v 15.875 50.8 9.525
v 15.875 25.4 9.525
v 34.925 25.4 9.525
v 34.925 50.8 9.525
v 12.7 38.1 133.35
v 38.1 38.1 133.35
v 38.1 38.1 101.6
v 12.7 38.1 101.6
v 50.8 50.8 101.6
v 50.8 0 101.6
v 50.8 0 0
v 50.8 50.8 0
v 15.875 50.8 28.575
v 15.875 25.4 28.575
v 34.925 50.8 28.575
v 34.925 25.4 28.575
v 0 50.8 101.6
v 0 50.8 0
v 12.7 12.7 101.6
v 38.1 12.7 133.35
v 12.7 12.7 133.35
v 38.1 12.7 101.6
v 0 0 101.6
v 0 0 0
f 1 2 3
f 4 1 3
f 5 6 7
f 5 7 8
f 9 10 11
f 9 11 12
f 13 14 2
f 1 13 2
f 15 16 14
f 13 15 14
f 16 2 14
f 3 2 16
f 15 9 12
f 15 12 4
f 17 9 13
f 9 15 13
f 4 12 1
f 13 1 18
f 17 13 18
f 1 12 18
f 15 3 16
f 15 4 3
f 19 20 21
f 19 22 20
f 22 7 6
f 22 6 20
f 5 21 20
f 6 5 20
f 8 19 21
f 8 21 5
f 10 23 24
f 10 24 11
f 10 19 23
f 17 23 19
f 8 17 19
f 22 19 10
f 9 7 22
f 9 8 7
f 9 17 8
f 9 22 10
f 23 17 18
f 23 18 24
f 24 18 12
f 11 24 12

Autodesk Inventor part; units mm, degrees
ref_plane "YZ Plane" through (0, 0, 0) normal (1, 0, 0) x (0, 1, 0)
ref_plane "XZ Plane" through (0, 0, 0) normal (0, 1, 0) x (-1, 0, 0)
ref_plane "XY Plane" through (0, 0, 0) normal (0, 0, 1) x (1, 0, 0)
sketch "Sketch1" plane through (0, 0, 0) normal (0, 0, 1) x (1, 0, 0)
  line L0 (0, 0) -> (50.8, 0)
  line L1 (50.8, 0) -> (50.8, 50.8)
  line L2 (50.8, 50.8) -> (0, 50.8)
  line L3 (0, 50.8) -> (0, 0)
  dimension "d0" = 50.8
  dimension "d1" = 50.8
extrude "Extrusion1" add sketch "Sketch1" along normal blind 101.6
sketch "Sketch2" plane through (0, 0, 101.6) normal (0, 0, 1) x (1, 0, 0)
  line L0 (50.8, 50.8) -> (0, 50.8) projected
  line L1 (25.4, 38.1) -> (12.7, 38.1)
  line L2 (12.7, 38.1) -> (38.1, 38.1)
  line L3 (38.1, 38.1) -> (38.1, 12.7)
  line L4 (38.1, 12.7) -> (12.7, 12.7)
  line L5 (12.7, 12.7) -> (12.7, 38.1)
  point P0 (0, 0)
  dimension "d8" = 25.4
  dimension "d9" = 25.4
extrude "Extrusion2" add sketch "Sketch2" along normal blind 31.75
sketch "Sketch3" plane through (0, 50.8, 0) normal (0, 1, 0) x (1, 0, 0)
  line L0 (50.8, 0) -> (0, 0) projected
  line L1 (25.4, 0) -> (25.4, -25.4)
  line L2 (25.4, -25.4) -> (19.05, -25.4)
  line L3 (19.05, -25.4) -> (19.05, -12.7)
  line L4 (19.05, -12.7) -> (25.4, -12.7)
  line L5 (25.4, -12.7) -> (25.4, -25.4)
  line L6 (25.4, -25.4) -> (31.75, -25.4)
  line L7 (31.75, -25.4) -> (31.75, -12.7)
  line L8 (31.75, -12.7) -> (25.4, -12.7)
  line L9 (25.4, -12.7) -> (25.4, -25.4)
  dimension "d12" = 25.4
  dimension "d13" = 6.35
  dimension "d14" = 12.7
  dimension "d15" = 6.35
extrude "Extrusion3" cut sketch "Sketch3" against normal blind 25.4
sketch "Sketch4" plane through (0, 50.8, 0) normal (0, 1, 0) x (1, 0, 0)
  line L0 (19.05, -25.4) -> (19.05, -12.7) projected
  line L1 (19.05, -19.05) -> (15.875, -19.05)
  line L2 (0, 0) -> (0, -101.6) projected
  line L3 (15.875, -19.05) -> (34.925, -19.05)
  line L4 (34.925, -19.05) -> (34.925, -28.575)
  line L5 (34.925, -28.575) -> (15.875, -28.575)
  line L6 (15.875, -28.575) -> (15.875, -19.05)
  line L7 (34.925, -19.05) -> (15.875, -19.05)
  line L8 (15.875, -19.05) -> (15.875, -9.525)
  line L9 (15.875, -9.525) -> (34.925, -9.525)
  line L10 (34.925, -9.525) -> (34.925, -19.05)
  dimension "d18" = 3.175
  dimension "d19" = 19.05
  dimension "d20" = 9.525
  dimension "d21" = 19.05
  dimension "d22" = 9.525
extrude "Extrusion4" cut sketch "Sketch4" against normal blind 25.4
properties part number "SquareCrank_SBail"
